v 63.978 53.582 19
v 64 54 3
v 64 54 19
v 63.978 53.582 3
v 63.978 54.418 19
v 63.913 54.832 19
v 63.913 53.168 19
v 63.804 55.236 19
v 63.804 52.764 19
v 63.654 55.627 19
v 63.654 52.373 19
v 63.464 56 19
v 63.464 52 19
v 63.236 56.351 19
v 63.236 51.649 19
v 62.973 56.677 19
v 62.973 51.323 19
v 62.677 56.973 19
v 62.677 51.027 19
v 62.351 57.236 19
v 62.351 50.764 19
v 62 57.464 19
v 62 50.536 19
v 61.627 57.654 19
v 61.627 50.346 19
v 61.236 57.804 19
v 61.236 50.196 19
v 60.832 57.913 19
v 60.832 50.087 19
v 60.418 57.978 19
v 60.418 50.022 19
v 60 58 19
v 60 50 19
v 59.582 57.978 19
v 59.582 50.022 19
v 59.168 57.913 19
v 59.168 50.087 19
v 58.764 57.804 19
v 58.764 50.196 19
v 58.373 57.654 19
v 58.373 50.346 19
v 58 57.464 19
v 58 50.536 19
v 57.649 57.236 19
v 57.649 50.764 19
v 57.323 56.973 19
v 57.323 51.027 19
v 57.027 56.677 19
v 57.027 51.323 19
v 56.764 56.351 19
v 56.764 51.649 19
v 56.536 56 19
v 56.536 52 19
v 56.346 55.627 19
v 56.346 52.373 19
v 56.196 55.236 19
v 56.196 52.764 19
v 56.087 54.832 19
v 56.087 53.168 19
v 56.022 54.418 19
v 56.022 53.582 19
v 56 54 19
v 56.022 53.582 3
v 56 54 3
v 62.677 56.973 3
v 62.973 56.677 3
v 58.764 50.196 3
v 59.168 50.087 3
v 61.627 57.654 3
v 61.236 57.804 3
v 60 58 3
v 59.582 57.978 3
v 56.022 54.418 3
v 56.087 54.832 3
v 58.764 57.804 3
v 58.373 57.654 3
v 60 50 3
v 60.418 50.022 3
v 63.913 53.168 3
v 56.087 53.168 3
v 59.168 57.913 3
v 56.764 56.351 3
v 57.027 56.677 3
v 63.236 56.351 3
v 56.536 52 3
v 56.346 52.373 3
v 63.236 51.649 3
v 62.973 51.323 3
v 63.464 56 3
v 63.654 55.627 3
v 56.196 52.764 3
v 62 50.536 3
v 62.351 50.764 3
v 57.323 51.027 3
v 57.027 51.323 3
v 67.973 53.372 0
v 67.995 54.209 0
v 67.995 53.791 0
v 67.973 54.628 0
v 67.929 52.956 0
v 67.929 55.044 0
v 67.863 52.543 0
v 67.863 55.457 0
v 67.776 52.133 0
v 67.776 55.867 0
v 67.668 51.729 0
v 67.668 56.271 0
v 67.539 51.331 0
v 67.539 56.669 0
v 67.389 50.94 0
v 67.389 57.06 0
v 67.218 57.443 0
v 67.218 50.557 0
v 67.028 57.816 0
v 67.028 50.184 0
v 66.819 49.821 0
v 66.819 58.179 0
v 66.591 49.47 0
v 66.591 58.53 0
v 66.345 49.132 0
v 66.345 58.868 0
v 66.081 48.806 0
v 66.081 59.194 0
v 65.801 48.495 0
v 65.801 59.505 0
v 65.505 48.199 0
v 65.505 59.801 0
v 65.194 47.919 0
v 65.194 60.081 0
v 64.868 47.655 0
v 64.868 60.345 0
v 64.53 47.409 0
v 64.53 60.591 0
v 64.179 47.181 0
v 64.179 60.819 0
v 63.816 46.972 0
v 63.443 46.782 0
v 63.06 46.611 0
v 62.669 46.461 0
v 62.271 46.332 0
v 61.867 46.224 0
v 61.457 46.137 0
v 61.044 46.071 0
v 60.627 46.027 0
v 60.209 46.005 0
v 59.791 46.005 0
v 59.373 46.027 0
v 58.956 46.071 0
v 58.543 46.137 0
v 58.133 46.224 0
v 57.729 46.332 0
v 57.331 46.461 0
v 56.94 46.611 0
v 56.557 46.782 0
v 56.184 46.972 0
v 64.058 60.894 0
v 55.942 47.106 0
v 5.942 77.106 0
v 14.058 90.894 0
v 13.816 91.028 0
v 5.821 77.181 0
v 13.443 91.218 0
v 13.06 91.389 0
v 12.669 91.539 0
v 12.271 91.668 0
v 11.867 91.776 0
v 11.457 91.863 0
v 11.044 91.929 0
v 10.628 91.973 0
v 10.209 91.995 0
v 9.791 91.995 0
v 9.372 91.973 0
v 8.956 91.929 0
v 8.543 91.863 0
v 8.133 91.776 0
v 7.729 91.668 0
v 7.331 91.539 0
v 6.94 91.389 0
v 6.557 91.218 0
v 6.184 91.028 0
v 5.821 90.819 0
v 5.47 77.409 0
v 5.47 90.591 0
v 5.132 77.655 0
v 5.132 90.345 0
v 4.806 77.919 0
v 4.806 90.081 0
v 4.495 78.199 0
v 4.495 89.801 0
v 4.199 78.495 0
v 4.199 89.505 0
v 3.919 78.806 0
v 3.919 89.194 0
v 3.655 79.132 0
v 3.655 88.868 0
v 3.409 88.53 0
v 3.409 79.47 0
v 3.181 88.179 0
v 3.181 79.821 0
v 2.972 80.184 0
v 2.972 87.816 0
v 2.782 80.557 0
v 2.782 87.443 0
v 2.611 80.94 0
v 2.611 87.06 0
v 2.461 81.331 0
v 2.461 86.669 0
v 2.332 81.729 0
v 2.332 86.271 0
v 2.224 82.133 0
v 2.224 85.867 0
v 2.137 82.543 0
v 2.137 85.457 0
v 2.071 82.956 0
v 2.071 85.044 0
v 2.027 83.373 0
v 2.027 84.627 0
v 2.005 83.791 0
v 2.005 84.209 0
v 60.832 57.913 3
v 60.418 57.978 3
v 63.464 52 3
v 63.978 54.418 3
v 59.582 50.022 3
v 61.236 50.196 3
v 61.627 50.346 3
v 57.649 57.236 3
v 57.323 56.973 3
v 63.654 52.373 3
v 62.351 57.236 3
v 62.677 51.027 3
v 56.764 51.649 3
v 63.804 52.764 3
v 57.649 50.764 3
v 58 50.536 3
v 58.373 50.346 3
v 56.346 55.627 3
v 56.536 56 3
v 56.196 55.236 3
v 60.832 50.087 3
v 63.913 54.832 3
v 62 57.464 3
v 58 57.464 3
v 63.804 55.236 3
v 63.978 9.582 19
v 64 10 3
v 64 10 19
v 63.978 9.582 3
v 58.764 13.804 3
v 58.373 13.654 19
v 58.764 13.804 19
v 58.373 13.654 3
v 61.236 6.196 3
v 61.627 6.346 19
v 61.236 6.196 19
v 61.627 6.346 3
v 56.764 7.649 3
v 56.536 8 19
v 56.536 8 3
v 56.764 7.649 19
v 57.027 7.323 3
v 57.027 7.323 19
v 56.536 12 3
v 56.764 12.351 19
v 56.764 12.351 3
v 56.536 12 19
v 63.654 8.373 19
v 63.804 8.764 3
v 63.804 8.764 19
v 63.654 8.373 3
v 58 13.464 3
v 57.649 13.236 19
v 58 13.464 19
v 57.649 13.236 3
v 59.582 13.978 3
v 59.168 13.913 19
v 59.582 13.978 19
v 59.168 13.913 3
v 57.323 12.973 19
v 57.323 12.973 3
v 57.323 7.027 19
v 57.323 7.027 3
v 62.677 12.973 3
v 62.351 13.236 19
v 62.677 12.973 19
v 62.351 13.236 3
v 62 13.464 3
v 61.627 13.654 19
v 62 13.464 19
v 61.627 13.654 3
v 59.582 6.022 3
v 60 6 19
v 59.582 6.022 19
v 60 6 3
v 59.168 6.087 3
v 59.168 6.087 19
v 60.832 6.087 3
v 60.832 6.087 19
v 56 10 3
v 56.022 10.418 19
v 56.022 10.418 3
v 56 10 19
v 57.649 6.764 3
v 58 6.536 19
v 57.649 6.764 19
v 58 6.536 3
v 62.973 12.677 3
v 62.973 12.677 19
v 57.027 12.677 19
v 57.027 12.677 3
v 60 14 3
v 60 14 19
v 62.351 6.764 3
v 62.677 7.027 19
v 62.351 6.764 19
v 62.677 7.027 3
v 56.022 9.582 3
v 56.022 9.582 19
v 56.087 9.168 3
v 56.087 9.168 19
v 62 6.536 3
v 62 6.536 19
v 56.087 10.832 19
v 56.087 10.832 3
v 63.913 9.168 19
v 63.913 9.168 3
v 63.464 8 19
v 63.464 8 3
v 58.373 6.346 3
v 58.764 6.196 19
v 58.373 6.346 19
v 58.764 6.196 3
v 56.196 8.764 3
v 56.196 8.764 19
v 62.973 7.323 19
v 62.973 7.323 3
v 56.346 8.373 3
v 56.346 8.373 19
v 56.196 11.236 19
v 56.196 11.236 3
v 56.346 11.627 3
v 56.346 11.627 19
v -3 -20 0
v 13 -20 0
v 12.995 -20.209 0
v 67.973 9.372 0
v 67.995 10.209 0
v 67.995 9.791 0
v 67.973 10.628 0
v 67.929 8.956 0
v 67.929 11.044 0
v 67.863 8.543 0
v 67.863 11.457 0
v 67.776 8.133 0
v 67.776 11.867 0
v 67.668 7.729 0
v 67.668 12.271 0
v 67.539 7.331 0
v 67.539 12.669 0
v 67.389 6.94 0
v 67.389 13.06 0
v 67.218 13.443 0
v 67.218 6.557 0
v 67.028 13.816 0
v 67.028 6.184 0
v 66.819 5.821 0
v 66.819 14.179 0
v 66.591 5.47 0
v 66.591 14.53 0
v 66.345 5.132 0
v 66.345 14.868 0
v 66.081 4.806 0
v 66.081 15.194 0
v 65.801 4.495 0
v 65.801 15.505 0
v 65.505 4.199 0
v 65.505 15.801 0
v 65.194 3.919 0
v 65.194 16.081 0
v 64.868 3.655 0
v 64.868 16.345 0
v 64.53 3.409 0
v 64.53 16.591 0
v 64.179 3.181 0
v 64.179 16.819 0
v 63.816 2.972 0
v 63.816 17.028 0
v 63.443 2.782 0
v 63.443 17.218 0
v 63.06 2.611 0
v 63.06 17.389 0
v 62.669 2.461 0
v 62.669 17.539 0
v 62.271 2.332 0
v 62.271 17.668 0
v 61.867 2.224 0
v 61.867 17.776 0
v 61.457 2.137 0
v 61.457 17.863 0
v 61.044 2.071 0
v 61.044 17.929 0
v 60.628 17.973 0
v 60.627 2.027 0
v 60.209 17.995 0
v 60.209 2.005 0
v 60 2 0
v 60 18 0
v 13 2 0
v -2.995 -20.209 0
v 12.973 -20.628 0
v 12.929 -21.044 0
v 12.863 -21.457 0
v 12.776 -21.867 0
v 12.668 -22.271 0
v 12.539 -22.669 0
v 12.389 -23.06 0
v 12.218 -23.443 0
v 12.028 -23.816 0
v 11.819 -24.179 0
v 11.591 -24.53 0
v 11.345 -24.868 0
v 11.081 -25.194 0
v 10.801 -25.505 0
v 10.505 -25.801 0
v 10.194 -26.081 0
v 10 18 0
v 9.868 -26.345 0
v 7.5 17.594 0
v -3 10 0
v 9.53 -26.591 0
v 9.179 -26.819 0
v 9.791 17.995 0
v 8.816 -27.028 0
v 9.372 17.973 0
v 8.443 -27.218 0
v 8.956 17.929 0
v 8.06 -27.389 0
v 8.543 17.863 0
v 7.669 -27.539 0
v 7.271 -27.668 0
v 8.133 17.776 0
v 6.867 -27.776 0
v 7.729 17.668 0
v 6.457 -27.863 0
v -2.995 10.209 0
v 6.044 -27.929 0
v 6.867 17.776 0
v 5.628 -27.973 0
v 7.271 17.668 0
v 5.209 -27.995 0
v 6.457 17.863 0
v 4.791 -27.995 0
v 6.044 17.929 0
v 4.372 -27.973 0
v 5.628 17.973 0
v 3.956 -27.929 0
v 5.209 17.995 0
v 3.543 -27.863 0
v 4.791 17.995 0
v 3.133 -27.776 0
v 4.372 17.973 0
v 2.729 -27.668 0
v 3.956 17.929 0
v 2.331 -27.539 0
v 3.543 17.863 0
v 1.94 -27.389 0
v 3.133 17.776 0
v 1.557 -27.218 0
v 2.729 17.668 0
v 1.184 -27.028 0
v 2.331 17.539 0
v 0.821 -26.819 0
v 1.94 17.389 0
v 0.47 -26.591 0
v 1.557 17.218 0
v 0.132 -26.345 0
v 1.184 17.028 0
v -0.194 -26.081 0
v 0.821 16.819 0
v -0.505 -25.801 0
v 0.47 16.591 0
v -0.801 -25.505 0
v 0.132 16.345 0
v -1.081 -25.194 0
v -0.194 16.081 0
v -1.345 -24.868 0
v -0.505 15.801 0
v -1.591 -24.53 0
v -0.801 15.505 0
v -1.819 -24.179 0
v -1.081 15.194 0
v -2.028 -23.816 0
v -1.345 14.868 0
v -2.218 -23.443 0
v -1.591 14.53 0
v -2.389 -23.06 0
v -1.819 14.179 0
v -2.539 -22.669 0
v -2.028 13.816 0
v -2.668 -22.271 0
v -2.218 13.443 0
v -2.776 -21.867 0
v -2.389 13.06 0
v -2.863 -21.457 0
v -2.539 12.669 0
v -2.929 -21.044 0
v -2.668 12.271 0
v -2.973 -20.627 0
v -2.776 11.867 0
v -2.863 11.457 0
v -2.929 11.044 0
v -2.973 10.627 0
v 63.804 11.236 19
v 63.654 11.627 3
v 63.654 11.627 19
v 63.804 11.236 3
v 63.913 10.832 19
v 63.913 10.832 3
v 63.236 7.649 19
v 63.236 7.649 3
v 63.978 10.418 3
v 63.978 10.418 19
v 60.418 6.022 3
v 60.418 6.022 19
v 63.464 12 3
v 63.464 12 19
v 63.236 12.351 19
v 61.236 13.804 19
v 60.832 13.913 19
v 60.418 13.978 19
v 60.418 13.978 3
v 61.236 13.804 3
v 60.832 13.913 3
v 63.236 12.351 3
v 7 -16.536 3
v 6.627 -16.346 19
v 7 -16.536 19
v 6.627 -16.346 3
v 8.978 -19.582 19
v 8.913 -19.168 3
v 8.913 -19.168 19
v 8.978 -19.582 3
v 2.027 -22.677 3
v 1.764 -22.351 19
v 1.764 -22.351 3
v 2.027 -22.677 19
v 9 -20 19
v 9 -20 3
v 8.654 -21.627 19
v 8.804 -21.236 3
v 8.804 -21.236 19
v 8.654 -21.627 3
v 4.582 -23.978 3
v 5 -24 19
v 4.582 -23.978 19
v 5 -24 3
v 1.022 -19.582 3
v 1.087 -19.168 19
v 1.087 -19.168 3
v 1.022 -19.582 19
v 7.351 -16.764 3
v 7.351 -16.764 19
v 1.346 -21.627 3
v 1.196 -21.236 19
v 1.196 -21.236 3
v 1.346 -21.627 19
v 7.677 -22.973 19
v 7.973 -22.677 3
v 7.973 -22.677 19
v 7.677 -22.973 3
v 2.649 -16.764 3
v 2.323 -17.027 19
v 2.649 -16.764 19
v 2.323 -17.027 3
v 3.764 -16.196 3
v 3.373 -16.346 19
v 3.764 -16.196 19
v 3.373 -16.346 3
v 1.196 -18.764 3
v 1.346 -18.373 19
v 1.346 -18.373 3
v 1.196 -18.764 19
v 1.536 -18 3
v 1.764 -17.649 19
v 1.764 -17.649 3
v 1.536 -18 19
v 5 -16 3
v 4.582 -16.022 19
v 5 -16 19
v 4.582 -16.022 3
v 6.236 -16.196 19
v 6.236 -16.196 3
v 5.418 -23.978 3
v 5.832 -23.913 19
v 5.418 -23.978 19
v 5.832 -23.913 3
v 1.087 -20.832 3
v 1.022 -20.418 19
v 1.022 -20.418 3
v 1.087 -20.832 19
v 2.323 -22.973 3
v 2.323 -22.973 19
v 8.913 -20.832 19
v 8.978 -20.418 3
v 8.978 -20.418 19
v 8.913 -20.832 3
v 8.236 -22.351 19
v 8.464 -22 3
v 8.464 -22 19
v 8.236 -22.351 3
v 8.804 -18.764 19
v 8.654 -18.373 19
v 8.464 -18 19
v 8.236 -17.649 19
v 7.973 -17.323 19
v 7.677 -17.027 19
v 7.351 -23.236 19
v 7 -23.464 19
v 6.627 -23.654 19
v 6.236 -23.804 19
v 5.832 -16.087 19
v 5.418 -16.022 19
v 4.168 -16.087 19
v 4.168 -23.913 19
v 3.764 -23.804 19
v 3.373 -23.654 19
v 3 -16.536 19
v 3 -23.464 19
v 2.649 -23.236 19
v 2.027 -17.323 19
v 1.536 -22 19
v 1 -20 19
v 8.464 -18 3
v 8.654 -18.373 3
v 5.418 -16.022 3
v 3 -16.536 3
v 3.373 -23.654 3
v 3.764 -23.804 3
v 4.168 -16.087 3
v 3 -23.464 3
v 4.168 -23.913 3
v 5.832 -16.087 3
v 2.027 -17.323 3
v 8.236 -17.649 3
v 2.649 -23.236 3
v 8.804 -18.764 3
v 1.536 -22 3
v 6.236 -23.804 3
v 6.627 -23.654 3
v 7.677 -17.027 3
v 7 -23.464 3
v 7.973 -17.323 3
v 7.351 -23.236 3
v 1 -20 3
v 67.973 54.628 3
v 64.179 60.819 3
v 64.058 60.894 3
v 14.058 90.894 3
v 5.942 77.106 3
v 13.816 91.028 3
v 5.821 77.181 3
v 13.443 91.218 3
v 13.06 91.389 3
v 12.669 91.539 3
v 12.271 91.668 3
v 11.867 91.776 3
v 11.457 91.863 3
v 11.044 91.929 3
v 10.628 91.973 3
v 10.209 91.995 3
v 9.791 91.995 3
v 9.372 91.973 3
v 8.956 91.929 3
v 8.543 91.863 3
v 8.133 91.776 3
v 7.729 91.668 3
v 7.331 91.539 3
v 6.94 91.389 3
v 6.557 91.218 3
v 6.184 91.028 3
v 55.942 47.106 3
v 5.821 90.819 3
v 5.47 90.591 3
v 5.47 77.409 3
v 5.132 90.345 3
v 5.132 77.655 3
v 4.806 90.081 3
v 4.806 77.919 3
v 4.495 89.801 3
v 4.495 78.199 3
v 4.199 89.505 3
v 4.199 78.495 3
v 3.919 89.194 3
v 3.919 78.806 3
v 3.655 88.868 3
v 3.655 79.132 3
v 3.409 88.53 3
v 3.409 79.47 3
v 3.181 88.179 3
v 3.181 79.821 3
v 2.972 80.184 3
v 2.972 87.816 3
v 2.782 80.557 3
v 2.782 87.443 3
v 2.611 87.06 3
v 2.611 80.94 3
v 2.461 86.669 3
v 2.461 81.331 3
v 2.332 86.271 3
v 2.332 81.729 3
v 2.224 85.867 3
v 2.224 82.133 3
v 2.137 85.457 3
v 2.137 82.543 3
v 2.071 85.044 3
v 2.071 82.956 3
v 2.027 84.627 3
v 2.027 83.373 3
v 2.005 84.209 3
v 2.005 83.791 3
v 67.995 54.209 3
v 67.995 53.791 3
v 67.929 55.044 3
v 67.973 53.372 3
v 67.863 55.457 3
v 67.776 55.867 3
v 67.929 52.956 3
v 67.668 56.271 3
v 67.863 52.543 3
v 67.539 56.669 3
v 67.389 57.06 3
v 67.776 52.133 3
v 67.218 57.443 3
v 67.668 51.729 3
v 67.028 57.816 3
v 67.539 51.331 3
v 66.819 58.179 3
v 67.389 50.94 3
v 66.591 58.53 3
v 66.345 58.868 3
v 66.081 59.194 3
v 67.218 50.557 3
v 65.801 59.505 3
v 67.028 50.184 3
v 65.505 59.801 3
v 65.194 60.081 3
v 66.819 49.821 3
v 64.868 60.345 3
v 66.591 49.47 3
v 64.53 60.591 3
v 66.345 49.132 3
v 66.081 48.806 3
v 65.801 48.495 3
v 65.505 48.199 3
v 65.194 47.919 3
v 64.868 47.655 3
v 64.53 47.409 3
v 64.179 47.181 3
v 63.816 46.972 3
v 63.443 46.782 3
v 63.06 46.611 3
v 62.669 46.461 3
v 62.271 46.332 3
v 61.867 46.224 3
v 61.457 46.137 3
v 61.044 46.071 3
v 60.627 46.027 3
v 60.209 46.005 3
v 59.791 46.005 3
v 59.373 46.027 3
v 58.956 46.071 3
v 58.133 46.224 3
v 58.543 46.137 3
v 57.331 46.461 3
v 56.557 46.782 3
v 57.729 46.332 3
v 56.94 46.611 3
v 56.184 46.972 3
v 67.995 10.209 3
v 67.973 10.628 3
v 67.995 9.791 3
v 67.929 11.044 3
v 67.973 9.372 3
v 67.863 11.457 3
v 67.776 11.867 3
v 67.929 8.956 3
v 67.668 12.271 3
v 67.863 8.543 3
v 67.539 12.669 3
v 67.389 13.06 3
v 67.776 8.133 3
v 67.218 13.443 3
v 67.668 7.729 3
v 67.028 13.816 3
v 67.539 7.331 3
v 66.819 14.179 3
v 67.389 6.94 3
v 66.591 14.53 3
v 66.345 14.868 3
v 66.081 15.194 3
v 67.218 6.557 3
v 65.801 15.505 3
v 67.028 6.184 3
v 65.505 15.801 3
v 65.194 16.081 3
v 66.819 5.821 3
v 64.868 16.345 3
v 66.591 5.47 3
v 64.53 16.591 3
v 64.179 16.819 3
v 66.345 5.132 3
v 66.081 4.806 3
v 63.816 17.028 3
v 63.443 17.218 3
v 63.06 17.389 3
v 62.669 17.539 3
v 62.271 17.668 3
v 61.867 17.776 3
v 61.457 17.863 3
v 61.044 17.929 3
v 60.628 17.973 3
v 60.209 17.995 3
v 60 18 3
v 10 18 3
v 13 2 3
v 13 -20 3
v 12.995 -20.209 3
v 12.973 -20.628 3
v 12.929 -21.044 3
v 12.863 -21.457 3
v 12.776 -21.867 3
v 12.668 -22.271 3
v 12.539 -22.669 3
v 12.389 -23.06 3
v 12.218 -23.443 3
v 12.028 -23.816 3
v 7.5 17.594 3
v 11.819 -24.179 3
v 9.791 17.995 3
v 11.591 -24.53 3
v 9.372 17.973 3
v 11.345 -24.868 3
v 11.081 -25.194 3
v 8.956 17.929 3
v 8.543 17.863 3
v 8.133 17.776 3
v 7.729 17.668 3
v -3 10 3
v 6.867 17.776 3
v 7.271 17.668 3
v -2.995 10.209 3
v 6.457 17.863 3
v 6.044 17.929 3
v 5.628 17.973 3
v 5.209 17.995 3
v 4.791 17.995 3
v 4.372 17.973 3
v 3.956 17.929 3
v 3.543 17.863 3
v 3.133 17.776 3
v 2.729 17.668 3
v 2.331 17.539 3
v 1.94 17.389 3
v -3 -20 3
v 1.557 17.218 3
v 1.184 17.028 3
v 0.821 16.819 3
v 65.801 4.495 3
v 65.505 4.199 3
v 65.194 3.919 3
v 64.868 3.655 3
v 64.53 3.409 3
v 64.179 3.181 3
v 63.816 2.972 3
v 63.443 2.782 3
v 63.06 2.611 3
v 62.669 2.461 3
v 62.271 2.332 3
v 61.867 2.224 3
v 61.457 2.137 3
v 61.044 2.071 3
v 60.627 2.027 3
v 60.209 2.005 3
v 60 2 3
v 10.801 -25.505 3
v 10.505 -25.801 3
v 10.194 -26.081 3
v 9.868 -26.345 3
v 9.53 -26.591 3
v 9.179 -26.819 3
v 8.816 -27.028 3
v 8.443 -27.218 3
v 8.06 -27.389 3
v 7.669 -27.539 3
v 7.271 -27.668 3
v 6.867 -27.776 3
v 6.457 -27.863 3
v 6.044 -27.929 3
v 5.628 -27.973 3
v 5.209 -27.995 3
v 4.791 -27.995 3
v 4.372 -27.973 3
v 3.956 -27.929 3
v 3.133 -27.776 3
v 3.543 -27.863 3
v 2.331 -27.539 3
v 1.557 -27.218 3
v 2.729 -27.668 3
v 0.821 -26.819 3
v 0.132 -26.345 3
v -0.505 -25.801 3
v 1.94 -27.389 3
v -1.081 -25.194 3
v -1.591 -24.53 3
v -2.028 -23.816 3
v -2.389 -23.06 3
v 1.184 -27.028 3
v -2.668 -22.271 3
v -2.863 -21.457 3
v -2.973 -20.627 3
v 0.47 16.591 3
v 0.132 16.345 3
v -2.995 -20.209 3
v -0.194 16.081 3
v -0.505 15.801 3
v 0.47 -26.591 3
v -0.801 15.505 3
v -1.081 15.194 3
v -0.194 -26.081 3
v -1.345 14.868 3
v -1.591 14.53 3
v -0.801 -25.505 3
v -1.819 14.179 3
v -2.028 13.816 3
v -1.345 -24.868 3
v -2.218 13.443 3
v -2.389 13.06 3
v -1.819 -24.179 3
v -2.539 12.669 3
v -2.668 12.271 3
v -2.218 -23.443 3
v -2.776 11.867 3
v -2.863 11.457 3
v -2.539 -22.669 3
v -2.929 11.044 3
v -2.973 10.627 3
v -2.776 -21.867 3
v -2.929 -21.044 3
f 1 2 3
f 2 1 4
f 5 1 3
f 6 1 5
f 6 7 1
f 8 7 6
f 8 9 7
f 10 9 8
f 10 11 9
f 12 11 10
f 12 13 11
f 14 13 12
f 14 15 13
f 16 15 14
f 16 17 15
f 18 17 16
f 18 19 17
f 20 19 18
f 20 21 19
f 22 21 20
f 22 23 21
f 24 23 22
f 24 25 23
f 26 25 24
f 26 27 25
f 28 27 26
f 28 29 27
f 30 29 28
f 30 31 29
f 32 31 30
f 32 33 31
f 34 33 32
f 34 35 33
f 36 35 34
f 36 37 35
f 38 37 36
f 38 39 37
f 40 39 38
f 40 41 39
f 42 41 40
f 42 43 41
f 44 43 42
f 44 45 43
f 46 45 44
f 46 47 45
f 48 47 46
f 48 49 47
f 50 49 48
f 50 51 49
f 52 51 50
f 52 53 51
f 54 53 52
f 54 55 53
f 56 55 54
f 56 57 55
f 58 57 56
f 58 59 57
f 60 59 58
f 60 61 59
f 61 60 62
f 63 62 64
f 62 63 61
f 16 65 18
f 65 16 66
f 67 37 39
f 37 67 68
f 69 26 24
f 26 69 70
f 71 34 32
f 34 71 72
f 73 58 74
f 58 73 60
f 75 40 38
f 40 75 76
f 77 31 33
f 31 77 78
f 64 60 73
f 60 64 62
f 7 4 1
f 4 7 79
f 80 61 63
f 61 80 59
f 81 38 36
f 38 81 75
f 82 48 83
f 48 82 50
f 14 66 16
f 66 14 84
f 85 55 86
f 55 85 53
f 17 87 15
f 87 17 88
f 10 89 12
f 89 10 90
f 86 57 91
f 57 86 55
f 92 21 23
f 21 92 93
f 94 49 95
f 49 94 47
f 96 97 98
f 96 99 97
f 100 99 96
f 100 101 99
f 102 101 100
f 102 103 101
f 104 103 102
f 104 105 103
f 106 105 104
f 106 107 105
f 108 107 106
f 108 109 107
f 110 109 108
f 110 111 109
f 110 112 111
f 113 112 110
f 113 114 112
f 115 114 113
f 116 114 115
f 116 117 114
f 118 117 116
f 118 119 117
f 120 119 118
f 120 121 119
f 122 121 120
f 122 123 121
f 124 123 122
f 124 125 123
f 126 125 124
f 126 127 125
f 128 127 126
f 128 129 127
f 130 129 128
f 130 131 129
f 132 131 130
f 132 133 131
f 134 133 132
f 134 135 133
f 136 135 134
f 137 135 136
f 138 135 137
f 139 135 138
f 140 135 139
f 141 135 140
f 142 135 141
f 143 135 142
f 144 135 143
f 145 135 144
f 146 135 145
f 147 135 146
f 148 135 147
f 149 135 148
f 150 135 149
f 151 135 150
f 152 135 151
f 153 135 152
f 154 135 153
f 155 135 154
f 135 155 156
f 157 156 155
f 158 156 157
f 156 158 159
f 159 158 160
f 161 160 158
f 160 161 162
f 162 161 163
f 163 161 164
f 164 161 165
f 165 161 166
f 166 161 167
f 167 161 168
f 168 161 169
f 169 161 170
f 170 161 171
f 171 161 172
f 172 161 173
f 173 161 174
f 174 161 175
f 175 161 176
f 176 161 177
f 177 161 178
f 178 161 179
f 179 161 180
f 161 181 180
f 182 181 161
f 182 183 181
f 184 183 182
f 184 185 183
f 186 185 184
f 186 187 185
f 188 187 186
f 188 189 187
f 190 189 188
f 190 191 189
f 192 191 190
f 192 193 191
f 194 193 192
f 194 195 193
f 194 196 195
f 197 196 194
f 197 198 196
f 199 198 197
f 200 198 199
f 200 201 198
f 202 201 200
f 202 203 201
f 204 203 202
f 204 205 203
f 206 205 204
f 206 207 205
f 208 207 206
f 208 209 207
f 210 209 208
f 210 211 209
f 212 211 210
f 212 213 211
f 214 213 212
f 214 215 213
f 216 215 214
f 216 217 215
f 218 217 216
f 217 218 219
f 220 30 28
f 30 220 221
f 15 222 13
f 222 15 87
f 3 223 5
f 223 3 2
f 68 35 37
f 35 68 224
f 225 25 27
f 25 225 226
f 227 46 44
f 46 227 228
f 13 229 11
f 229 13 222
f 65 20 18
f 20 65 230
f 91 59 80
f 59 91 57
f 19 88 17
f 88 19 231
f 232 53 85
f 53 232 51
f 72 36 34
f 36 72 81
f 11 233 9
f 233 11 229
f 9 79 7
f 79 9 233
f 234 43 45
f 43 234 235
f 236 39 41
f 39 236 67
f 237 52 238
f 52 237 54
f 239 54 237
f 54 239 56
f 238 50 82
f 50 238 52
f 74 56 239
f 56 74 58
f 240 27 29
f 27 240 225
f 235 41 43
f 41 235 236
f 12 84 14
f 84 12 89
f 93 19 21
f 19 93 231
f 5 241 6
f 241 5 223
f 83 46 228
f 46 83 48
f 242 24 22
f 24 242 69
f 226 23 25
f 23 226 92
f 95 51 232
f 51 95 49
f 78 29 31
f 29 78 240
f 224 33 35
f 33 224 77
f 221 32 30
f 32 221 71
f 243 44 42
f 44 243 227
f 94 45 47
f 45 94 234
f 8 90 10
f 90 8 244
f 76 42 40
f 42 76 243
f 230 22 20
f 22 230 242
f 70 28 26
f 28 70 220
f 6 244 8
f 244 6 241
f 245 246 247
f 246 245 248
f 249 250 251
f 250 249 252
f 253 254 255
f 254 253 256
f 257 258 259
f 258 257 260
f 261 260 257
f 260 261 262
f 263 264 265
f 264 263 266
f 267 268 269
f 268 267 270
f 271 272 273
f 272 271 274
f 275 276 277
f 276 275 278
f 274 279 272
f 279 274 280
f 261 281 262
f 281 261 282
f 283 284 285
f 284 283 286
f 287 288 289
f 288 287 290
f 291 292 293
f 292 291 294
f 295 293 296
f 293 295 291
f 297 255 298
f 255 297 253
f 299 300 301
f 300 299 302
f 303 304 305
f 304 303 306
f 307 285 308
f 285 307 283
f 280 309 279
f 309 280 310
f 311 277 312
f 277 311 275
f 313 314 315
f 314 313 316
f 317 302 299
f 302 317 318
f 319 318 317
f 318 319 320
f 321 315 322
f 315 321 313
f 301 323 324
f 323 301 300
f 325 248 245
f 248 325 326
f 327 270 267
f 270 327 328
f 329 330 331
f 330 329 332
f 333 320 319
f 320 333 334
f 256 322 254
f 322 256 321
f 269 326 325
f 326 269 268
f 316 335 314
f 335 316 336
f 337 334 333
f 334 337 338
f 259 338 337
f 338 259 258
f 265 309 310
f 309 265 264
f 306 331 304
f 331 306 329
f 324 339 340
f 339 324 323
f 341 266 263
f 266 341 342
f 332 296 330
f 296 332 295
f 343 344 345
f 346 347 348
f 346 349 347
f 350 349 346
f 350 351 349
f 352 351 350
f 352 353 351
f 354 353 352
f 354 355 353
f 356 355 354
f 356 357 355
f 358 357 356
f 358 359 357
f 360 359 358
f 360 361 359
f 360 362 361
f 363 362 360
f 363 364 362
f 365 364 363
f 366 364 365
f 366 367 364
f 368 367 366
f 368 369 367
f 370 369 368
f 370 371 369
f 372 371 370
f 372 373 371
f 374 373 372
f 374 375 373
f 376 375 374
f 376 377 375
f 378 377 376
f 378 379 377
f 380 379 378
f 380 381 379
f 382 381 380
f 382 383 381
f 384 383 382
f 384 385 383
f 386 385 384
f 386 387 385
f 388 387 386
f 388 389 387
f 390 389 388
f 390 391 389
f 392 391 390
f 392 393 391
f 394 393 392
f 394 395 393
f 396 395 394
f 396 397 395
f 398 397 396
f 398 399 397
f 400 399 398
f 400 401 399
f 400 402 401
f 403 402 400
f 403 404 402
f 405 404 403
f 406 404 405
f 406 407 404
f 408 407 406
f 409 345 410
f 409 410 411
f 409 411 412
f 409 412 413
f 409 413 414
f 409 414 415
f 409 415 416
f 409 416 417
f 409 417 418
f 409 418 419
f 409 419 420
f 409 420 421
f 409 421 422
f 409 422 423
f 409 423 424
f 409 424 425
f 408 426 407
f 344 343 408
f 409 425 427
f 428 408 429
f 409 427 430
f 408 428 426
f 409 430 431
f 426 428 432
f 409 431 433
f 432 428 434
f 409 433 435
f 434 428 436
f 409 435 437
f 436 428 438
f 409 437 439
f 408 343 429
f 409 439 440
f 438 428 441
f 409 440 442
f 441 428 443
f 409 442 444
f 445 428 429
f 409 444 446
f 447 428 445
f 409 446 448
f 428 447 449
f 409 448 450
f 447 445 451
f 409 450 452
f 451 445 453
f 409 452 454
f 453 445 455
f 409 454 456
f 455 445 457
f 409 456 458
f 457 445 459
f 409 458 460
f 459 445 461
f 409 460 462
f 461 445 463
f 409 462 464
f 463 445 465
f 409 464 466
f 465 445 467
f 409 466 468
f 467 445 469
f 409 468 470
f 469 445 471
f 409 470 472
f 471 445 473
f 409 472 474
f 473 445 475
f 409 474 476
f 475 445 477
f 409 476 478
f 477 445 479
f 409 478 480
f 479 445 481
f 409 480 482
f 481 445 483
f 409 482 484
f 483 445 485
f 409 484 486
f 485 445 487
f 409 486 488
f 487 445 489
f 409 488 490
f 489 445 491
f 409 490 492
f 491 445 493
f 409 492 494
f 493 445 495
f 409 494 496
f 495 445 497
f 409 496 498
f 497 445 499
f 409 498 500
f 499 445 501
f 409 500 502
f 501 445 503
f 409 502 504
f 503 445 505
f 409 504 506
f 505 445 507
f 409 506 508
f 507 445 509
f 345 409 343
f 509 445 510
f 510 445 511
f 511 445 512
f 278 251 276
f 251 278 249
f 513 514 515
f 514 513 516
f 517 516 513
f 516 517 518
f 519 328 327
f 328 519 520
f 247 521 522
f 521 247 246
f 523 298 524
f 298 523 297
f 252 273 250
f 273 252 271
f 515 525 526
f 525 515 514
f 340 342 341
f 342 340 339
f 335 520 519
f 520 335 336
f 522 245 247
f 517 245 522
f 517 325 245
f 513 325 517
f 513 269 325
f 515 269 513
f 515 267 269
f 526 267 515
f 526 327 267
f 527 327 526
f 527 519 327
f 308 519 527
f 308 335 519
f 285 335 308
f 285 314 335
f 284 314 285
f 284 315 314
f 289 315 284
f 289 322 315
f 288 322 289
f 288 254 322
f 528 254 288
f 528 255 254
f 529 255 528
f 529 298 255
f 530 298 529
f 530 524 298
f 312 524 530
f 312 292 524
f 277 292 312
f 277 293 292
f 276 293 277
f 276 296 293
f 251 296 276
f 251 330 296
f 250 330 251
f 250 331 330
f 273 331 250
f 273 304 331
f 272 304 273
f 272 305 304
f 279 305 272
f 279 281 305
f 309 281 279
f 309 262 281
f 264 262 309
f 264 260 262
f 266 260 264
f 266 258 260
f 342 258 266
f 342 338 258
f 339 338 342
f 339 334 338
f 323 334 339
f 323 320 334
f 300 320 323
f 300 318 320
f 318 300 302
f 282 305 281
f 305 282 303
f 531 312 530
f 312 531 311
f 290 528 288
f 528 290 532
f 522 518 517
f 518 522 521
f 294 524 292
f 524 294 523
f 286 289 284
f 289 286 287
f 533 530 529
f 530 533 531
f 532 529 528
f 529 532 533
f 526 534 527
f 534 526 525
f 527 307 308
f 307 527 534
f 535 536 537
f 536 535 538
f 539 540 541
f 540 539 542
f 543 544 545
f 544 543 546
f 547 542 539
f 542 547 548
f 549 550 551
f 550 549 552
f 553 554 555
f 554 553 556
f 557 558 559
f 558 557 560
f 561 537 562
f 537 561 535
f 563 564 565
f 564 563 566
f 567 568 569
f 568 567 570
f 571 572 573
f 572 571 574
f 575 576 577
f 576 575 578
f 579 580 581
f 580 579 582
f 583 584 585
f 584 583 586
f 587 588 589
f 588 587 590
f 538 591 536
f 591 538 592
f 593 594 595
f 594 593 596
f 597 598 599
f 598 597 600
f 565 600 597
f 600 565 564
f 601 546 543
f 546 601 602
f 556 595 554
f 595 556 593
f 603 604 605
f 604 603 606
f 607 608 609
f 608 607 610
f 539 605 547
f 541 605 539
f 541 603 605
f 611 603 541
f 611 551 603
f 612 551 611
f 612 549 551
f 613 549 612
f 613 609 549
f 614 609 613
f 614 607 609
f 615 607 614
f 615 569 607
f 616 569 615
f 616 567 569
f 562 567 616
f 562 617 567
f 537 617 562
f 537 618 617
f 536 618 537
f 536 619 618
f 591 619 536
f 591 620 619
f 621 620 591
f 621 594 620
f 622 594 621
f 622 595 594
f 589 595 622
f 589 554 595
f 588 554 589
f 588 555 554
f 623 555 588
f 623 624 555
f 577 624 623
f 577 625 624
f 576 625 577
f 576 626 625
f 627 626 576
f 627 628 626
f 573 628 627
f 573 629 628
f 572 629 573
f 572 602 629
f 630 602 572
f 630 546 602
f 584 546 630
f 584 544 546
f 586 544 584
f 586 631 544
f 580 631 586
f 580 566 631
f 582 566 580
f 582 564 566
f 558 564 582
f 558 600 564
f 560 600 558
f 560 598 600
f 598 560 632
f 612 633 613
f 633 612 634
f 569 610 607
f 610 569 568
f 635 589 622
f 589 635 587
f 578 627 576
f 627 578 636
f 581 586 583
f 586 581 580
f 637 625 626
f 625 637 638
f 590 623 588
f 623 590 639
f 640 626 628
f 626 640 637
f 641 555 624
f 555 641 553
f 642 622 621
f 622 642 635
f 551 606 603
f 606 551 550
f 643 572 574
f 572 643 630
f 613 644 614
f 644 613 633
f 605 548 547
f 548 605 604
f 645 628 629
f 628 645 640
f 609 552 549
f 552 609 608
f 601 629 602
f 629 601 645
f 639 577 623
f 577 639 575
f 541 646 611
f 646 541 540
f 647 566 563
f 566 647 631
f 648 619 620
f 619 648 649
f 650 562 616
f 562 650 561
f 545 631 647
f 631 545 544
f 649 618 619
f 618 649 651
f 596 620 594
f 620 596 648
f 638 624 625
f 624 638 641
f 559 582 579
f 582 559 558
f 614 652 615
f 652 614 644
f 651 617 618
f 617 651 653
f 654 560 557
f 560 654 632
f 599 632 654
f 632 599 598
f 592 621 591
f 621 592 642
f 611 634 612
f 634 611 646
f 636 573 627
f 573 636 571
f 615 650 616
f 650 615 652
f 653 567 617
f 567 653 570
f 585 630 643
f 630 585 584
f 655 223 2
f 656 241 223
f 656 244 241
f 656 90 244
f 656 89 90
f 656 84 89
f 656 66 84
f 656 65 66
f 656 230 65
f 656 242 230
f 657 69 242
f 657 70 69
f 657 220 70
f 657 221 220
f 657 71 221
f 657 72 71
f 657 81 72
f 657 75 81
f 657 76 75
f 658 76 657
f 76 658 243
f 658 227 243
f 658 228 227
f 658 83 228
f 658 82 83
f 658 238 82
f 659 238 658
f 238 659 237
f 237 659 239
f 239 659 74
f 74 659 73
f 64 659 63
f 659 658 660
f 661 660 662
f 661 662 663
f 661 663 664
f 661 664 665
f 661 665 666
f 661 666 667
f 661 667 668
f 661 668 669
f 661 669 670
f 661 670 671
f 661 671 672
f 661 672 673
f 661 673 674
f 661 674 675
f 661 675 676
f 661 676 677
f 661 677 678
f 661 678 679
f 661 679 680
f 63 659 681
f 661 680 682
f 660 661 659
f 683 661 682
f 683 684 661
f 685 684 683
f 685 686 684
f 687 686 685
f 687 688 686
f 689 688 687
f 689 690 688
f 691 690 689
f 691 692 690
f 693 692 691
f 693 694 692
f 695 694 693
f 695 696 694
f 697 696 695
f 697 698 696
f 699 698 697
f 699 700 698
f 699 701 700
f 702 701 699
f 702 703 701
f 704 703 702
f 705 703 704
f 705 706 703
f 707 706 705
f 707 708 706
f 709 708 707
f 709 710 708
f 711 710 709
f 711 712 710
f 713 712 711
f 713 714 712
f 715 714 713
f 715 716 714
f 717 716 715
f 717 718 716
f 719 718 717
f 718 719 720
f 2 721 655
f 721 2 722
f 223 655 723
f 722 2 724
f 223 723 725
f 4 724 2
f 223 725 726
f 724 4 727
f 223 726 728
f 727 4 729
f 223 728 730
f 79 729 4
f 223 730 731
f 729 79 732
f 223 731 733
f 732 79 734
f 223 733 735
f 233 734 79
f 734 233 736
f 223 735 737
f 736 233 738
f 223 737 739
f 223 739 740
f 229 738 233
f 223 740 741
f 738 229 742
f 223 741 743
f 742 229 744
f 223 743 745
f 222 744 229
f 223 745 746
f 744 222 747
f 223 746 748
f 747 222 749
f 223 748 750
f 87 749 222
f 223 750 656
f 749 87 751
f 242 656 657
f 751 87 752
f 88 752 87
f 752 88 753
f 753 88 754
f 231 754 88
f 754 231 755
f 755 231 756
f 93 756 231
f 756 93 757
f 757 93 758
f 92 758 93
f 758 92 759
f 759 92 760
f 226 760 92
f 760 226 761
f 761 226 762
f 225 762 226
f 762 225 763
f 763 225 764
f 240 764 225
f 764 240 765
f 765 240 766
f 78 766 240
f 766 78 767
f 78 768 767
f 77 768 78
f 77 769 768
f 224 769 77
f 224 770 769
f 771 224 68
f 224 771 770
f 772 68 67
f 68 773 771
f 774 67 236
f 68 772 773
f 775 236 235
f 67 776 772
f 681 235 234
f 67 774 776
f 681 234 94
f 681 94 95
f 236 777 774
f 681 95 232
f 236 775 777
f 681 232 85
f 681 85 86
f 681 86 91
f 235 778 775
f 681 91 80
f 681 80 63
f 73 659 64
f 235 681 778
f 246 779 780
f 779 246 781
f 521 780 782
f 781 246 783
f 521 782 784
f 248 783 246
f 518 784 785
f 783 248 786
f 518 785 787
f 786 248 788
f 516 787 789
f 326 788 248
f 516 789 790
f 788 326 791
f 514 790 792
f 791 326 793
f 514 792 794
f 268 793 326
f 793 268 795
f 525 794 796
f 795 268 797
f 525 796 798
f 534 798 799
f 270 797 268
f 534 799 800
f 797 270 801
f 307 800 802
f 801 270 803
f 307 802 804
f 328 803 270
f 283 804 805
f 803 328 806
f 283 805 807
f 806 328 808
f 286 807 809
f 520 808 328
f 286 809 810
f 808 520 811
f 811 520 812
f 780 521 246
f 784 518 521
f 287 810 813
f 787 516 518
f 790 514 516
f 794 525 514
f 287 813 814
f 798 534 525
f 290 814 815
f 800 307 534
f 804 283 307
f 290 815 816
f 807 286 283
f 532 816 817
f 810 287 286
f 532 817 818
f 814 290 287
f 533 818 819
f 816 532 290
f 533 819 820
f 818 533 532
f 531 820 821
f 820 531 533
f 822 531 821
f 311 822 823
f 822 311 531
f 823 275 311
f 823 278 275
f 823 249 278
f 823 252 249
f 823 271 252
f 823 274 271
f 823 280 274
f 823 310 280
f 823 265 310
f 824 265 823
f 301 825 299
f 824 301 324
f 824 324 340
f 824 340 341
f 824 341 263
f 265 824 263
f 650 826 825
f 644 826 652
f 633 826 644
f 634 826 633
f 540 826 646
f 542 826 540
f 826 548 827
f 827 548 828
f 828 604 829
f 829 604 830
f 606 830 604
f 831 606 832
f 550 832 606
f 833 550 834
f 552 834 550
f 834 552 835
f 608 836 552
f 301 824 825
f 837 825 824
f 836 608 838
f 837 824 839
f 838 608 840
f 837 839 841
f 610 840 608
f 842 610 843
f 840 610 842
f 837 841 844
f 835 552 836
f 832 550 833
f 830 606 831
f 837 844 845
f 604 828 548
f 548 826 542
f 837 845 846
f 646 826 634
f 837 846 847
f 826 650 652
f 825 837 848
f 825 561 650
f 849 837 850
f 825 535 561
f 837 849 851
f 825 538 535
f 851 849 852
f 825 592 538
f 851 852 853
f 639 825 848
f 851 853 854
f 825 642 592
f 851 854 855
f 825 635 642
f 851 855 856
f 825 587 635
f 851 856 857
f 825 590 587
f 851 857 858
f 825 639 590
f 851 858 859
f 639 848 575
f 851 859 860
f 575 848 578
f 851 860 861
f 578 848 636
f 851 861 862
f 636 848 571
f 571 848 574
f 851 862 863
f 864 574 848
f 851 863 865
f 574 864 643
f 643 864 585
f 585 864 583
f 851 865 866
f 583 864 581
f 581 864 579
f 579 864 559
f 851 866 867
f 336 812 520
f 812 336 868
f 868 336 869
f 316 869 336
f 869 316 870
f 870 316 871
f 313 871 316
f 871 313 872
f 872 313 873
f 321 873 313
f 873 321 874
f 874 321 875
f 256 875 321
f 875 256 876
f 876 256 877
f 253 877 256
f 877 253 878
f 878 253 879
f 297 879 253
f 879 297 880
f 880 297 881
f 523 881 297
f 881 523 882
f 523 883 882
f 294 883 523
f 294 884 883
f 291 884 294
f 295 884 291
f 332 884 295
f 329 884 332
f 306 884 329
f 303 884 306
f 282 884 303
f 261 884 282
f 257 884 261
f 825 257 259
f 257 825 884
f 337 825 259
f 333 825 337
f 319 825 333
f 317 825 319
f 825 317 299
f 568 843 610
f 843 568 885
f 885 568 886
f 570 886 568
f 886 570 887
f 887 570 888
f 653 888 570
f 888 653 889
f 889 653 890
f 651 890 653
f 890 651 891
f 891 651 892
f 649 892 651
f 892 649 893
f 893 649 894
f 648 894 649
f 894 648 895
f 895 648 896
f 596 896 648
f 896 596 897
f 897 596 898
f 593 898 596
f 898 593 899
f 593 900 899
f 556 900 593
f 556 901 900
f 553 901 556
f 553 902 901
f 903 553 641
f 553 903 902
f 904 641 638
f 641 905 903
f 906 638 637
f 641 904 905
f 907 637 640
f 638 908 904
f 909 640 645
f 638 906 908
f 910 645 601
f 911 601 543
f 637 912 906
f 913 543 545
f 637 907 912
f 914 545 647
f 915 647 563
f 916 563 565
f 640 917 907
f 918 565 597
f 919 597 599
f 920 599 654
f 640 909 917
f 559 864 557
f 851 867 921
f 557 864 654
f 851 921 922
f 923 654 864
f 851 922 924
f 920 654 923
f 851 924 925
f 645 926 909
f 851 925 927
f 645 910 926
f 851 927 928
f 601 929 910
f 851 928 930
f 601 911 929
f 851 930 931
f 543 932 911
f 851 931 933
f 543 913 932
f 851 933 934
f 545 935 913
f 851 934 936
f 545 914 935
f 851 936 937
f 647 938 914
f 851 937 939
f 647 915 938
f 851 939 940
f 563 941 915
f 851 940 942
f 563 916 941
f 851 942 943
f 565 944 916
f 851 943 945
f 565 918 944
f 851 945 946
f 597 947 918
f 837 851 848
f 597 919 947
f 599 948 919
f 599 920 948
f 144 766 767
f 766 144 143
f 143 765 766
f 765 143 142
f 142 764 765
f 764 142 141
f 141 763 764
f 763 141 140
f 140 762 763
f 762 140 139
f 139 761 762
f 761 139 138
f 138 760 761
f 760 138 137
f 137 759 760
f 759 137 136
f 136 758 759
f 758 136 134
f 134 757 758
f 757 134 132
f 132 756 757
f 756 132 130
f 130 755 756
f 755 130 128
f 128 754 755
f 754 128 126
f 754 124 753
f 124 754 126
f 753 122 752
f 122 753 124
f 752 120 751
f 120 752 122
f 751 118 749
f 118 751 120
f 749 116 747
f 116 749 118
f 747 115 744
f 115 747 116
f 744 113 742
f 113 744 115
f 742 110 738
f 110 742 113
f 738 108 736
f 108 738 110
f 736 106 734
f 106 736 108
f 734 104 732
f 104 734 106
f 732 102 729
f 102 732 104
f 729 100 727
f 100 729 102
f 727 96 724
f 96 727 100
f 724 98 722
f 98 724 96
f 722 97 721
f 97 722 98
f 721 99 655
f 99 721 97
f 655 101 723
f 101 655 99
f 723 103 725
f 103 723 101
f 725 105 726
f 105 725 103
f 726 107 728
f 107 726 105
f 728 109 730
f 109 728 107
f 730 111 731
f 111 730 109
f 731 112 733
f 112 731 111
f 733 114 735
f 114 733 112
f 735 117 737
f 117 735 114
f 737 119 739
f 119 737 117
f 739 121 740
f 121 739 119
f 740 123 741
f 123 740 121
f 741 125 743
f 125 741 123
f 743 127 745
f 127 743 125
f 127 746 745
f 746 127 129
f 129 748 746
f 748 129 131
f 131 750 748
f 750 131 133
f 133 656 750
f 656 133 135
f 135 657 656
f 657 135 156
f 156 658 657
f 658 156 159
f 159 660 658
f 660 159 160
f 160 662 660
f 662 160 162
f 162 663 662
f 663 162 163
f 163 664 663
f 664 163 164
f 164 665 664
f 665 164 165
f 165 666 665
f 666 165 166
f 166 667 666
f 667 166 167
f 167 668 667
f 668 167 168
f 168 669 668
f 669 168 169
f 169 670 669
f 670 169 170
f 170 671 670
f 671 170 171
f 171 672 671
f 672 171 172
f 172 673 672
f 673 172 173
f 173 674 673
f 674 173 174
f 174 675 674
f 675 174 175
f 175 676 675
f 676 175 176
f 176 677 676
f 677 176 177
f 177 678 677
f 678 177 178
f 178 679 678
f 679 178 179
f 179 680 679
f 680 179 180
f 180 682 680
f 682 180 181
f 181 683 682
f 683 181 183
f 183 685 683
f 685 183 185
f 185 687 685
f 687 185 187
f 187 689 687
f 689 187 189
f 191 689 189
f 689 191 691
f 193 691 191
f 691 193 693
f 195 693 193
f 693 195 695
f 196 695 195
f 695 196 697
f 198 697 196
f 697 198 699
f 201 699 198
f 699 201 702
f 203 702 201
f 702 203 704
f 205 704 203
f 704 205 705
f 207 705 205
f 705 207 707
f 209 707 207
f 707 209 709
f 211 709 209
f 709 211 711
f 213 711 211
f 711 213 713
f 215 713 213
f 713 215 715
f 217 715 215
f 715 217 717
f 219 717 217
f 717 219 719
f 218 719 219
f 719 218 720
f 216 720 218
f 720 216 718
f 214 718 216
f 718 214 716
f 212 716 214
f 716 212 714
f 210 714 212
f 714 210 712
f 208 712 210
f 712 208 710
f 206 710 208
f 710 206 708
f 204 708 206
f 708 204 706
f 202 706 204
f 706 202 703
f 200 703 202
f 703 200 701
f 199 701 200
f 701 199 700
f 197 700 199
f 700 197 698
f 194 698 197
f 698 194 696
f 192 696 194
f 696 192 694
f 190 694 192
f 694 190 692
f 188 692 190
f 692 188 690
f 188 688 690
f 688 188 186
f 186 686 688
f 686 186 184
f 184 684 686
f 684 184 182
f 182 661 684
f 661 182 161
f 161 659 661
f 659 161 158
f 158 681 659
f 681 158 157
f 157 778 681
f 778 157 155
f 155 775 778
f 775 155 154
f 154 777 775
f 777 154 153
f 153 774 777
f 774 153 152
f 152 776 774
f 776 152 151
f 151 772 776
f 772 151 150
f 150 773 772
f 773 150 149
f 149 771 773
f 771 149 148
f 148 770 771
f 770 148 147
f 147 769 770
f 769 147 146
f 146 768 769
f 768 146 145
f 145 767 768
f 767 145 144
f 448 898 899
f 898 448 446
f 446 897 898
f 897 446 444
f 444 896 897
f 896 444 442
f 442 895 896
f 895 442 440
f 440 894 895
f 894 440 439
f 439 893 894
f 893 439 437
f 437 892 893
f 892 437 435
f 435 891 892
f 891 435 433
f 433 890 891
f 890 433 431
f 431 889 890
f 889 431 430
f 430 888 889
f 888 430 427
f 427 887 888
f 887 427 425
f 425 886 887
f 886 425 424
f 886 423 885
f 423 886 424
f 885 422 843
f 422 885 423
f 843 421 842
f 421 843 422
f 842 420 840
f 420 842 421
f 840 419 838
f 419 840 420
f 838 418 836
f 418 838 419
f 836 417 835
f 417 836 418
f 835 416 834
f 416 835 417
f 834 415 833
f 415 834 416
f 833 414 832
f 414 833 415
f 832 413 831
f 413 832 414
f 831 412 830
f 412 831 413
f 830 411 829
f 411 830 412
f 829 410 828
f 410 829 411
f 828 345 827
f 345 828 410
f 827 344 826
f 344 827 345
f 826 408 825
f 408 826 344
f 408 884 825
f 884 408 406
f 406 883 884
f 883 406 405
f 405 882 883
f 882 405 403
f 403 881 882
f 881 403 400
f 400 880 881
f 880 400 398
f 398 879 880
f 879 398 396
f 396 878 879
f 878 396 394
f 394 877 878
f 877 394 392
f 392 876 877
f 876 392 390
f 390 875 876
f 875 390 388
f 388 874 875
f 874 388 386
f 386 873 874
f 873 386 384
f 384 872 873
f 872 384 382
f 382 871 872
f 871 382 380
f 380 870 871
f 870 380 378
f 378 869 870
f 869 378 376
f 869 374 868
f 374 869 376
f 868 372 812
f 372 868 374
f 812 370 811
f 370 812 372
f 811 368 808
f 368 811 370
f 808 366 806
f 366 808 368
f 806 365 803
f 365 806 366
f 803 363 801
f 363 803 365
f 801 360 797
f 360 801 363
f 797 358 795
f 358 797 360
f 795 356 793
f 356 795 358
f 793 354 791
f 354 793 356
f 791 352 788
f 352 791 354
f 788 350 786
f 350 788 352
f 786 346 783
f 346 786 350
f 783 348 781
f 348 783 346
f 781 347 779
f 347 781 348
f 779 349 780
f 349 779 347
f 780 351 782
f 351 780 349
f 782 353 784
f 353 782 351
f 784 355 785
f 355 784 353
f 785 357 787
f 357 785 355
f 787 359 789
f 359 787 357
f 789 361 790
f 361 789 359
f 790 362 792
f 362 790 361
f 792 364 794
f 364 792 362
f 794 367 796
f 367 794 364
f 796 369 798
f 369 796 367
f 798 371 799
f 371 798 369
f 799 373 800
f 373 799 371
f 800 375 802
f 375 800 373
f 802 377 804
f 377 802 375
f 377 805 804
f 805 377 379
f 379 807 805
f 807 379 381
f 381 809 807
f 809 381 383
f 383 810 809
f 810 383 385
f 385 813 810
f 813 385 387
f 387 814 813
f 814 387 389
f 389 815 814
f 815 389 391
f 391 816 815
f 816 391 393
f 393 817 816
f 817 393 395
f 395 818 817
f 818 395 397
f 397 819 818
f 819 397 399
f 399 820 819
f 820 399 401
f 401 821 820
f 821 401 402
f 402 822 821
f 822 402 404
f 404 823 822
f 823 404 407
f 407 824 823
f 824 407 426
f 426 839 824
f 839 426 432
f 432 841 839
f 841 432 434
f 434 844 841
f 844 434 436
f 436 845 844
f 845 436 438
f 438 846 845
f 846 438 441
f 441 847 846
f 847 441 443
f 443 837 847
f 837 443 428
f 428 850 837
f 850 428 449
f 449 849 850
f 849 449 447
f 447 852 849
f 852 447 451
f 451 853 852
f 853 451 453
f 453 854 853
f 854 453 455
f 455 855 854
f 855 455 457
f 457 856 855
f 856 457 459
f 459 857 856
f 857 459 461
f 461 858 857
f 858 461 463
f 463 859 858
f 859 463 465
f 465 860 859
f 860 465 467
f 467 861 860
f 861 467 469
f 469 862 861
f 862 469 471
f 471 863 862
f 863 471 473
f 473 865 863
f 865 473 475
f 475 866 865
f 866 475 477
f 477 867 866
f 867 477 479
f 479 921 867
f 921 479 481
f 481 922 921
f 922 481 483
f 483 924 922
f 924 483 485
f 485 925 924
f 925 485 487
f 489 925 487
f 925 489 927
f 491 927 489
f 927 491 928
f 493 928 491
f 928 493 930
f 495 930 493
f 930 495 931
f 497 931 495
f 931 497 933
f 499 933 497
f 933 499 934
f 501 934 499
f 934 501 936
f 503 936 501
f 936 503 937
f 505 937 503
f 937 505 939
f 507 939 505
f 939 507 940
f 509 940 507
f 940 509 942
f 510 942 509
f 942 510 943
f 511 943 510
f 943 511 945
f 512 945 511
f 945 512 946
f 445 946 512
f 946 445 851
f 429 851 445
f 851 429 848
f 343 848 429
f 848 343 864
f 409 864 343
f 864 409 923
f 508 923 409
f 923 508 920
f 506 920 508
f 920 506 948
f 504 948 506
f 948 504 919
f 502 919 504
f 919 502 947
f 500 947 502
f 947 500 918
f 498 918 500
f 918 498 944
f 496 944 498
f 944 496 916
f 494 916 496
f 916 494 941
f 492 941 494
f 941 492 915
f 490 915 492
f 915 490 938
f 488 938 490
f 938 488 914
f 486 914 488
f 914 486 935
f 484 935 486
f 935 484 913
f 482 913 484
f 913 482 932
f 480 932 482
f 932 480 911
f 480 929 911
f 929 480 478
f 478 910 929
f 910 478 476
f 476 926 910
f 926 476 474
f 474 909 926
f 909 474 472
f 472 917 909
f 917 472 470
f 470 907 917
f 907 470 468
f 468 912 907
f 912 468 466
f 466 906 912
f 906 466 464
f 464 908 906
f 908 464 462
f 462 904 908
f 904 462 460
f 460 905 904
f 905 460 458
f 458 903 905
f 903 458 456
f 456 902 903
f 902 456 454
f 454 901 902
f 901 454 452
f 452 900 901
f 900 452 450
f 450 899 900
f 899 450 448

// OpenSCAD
// file: keynote_chassis_base.scad
platform_height = 3;
stilt_height = 16;

x_index = 0;
y_index = 1;
anchor_x_index = 2;
anchor_y_index = 3;

module led_holes() {
    import (file = dxf_file, layer="led_holes", $fn = 60);
}

module left_screw_holes() {
    import (file = dxf_file, layer="screw_holes", $fn = 60);
}

module right_screw_holes() {
    import (file = dxf_file, layer="right_screw_holes", $fn = 60);
}

module stilt(x, y) {
    translate([x, y, 0]){
        circle(r=4, $fn=60);
    }
}

module stilt_platforms(stilt_locations) {
    for (i=[0:len(stilt_locations) - 1]) {
        offset(r = 4) {
            hull() {
                stilt(stilt_locations[i][x_index], stilt_locations[i][y_index]);
                stilt(stilt_locations[i][anchor_x_index], stilt_locations[i][anchor_y_index]);
            }
        }
    }
}

module extruted_stilts(stilt_locations) {
    for (i=[0:len(stilt_locations) - 1]) {
        linear_extrude(height = stilt_height + platform_height, center=false, convexity=10, twist=0) {
            stilt(stilt_locations[i][x_index], stilt_locations[i][y_index]);
        }
    }
}

linear_extrude(height=platform_height, center=false, convexity=10, twist=0) {
    difference() {
        union() {
            offset(3) {
                hull() led_holes();
                hull() left_screw_holes();
                hull() right_screw_holes();
            }
            stilt_platforms(stilt_locations);
        }
        union() {
            led_holes();
            left_screw_holes();
            right_screw_holes();
        }
    }
}

extruted_stilts(stilt_locations);
// main file
module bottom_assembly() {
    // stilts == "standoffs", pegs that sit against the acrylic to keep the assembly at the correct distance
    stilt_locations = [
        // x, y, anchor_x, anchor_y
        // x and y define the center point of the stilt
        // the anchor coords tell where the stilt's platform originates from
        [60, 54, 10, 84],
        [60, 10, 10, 10],
        [5, -20, 5, 10],
    ];

    dxf_file = "keynote_dxf_clef_holes_single_screw_bottom.dxf";

    include <keynote_chassis_base.scad>
}

bottom_assembly();
